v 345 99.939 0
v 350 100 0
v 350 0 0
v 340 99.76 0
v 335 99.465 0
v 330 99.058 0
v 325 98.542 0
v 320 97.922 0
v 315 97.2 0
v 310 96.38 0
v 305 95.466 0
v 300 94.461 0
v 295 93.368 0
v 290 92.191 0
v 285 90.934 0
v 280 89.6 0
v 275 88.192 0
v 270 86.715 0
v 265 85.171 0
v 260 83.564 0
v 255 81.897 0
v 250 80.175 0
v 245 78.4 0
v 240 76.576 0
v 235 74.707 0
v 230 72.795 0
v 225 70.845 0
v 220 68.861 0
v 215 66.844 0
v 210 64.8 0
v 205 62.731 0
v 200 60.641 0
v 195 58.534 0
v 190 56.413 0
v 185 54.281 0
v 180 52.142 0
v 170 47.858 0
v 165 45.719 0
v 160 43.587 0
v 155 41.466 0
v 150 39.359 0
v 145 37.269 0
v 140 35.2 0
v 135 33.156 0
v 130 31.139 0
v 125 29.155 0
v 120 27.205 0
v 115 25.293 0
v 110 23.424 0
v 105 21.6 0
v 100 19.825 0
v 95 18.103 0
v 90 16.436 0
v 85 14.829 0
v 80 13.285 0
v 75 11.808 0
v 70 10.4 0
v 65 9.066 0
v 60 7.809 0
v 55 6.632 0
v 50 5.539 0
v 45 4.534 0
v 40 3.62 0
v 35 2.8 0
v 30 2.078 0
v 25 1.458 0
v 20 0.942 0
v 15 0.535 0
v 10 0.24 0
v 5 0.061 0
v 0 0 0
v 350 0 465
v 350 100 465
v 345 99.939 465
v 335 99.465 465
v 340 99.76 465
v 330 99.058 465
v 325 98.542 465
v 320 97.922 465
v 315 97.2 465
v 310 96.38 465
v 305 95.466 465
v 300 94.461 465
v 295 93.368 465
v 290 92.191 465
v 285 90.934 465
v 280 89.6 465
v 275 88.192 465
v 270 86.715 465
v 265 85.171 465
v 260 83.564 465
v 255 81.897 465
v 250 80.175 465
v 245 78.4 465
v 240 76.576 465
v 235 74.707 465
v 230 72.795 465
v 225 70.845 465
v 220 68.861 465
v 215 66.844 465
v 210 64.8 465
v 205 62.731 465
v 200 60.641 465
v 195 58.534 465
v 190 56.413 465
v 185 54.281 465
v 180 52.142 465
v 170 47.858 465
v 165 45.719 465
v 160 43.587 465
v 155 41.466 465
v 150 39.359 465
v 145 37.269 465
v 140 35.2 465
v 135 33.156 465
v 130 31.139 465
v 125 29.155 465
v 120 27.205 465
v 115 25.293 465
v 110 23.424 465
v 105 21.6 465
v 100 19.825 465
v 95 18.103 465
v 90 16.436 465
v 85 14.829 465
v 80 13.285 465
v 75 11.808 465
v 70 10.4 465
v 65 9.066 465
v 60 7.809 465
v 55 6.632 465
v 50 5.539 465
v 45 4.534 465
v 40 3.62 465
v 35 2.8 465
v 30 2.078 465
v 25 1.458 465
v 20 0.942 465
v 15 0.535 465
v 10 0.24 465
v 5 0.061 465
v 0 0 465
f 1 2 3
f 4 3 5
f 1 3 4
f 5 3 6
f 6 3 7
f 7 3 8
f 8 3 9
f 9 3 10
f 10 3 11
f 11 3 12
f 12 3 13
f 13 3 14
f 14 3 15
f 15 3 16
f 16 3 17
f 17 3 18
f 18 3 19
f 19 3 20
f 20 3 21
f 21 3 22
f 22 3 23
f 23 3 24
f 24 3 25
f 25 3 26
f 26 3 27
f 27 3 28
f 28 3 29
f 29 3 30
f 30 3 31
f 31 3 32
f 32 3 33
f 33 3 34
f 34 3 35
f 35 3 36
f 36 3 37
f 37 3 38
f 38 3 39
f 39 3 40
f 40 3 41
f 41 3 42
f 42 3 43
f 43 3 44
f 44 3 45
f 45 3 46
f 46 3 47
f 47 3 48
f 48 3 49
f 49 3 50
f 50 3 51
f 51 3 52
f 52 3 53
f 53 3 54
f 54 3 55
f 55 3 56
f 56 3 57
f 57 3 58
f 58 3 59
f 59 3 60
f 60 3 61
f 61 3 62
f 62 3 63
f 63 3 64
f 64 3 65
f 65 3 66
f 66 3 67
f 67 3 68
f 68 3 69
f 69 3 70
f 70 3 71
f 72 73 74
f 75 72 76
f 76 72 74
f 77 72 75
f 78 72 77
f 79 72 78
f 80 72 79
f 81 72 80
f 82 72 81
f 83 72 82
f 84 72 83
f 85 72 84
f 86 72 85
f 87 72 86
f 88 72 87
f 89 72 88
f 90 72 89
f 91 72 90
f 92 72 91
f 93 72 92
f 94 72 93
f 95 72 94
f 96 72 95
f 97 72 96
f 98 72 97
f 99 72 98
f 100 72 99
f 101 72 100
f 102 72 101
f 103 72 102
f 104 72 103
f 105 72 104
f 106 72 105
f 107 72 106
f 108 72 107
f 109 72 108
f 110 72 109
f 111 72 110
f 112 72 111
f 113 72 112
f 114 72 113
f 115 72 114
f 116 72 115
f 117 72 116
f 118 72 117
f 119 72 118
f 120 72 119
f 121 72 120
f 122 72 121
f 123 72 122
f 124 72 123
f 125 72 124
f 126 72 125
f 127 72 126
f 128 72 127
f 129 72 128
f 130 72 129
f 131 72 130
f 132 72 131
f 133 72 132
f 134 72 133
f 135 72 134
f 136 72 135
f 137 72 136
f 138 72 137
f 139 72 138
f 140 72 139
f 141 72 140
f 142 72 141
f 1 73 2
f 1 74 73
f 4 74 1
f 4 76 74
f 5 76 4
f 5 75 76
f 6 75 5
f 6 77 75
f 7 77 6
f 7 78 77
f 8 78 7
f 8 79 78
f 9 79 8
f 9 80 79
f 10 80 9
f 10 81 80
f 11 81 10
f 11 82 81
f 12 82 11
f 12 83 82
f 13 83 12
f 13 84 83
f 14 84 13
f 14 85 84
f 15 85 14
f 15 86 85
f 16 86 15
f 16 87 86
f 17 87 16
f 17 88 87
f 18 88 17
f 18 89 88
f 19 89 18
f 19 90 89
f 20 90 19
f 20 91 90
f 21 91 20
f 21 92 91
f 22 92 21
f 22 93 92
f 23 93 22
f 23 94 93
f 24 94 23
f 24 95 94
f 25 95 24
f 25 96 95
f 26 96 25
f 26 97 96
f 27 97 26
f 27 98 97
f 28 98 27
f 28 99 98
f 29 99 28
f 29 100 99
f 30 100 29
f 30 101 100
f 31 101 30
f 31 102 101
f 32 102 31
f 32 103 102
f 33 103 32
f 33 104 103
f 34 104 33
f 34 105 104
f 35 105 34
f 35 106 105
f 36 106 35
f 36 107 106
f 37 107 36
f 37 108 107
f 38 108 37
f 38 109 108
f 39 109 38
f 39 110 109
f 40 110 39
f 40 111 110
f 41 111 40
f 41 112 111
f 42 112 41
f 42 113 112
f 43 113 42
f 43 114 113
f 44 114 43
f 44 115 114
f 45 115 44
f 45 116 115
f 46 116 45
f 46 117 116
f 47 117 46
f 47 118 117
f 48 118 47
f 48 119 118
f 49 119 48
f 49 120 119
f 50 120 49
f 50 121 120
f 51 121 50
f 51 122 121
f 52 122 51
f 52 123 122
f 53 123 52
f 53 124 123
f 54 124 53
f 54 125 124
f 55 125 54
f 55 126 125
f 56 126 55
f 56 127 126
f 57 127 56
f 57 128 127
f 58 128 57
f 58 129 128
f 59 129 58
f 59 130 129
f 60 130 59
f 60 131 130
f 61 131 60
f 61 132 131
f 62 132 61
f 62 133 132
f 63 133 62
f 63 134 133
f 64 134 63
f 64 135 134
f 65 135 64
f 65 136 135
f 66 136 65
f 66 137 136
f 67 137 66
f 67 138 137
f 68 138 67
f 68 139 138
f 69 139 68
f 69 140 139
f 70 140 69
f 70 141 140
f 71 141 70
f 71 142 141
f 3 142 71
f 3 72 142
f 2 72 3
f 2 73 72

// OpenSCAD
// Pieza Lz (ancho = Ly = 470)
Lx = 350;
Ly = 465;
Lreduccion = 100;

a0 = -2 * Lreduccion / pow(Lx, 3);
a1 = 3 * Lreduccion / pow(Lx, 2);

linear_extrude(height = Ly)
    polygon(concat(
        [[0, 0]],                      // inicio piso
        [for (x = [0:5:Lx]) [x, 0]],   // línea del piso
        [for (x = [Lx:-5:0]) [x, a0 * pow(x, 3) + a1 * pow(x, 2)]], // curva superior
        [[0, 0]]                       // cierre
    ));
